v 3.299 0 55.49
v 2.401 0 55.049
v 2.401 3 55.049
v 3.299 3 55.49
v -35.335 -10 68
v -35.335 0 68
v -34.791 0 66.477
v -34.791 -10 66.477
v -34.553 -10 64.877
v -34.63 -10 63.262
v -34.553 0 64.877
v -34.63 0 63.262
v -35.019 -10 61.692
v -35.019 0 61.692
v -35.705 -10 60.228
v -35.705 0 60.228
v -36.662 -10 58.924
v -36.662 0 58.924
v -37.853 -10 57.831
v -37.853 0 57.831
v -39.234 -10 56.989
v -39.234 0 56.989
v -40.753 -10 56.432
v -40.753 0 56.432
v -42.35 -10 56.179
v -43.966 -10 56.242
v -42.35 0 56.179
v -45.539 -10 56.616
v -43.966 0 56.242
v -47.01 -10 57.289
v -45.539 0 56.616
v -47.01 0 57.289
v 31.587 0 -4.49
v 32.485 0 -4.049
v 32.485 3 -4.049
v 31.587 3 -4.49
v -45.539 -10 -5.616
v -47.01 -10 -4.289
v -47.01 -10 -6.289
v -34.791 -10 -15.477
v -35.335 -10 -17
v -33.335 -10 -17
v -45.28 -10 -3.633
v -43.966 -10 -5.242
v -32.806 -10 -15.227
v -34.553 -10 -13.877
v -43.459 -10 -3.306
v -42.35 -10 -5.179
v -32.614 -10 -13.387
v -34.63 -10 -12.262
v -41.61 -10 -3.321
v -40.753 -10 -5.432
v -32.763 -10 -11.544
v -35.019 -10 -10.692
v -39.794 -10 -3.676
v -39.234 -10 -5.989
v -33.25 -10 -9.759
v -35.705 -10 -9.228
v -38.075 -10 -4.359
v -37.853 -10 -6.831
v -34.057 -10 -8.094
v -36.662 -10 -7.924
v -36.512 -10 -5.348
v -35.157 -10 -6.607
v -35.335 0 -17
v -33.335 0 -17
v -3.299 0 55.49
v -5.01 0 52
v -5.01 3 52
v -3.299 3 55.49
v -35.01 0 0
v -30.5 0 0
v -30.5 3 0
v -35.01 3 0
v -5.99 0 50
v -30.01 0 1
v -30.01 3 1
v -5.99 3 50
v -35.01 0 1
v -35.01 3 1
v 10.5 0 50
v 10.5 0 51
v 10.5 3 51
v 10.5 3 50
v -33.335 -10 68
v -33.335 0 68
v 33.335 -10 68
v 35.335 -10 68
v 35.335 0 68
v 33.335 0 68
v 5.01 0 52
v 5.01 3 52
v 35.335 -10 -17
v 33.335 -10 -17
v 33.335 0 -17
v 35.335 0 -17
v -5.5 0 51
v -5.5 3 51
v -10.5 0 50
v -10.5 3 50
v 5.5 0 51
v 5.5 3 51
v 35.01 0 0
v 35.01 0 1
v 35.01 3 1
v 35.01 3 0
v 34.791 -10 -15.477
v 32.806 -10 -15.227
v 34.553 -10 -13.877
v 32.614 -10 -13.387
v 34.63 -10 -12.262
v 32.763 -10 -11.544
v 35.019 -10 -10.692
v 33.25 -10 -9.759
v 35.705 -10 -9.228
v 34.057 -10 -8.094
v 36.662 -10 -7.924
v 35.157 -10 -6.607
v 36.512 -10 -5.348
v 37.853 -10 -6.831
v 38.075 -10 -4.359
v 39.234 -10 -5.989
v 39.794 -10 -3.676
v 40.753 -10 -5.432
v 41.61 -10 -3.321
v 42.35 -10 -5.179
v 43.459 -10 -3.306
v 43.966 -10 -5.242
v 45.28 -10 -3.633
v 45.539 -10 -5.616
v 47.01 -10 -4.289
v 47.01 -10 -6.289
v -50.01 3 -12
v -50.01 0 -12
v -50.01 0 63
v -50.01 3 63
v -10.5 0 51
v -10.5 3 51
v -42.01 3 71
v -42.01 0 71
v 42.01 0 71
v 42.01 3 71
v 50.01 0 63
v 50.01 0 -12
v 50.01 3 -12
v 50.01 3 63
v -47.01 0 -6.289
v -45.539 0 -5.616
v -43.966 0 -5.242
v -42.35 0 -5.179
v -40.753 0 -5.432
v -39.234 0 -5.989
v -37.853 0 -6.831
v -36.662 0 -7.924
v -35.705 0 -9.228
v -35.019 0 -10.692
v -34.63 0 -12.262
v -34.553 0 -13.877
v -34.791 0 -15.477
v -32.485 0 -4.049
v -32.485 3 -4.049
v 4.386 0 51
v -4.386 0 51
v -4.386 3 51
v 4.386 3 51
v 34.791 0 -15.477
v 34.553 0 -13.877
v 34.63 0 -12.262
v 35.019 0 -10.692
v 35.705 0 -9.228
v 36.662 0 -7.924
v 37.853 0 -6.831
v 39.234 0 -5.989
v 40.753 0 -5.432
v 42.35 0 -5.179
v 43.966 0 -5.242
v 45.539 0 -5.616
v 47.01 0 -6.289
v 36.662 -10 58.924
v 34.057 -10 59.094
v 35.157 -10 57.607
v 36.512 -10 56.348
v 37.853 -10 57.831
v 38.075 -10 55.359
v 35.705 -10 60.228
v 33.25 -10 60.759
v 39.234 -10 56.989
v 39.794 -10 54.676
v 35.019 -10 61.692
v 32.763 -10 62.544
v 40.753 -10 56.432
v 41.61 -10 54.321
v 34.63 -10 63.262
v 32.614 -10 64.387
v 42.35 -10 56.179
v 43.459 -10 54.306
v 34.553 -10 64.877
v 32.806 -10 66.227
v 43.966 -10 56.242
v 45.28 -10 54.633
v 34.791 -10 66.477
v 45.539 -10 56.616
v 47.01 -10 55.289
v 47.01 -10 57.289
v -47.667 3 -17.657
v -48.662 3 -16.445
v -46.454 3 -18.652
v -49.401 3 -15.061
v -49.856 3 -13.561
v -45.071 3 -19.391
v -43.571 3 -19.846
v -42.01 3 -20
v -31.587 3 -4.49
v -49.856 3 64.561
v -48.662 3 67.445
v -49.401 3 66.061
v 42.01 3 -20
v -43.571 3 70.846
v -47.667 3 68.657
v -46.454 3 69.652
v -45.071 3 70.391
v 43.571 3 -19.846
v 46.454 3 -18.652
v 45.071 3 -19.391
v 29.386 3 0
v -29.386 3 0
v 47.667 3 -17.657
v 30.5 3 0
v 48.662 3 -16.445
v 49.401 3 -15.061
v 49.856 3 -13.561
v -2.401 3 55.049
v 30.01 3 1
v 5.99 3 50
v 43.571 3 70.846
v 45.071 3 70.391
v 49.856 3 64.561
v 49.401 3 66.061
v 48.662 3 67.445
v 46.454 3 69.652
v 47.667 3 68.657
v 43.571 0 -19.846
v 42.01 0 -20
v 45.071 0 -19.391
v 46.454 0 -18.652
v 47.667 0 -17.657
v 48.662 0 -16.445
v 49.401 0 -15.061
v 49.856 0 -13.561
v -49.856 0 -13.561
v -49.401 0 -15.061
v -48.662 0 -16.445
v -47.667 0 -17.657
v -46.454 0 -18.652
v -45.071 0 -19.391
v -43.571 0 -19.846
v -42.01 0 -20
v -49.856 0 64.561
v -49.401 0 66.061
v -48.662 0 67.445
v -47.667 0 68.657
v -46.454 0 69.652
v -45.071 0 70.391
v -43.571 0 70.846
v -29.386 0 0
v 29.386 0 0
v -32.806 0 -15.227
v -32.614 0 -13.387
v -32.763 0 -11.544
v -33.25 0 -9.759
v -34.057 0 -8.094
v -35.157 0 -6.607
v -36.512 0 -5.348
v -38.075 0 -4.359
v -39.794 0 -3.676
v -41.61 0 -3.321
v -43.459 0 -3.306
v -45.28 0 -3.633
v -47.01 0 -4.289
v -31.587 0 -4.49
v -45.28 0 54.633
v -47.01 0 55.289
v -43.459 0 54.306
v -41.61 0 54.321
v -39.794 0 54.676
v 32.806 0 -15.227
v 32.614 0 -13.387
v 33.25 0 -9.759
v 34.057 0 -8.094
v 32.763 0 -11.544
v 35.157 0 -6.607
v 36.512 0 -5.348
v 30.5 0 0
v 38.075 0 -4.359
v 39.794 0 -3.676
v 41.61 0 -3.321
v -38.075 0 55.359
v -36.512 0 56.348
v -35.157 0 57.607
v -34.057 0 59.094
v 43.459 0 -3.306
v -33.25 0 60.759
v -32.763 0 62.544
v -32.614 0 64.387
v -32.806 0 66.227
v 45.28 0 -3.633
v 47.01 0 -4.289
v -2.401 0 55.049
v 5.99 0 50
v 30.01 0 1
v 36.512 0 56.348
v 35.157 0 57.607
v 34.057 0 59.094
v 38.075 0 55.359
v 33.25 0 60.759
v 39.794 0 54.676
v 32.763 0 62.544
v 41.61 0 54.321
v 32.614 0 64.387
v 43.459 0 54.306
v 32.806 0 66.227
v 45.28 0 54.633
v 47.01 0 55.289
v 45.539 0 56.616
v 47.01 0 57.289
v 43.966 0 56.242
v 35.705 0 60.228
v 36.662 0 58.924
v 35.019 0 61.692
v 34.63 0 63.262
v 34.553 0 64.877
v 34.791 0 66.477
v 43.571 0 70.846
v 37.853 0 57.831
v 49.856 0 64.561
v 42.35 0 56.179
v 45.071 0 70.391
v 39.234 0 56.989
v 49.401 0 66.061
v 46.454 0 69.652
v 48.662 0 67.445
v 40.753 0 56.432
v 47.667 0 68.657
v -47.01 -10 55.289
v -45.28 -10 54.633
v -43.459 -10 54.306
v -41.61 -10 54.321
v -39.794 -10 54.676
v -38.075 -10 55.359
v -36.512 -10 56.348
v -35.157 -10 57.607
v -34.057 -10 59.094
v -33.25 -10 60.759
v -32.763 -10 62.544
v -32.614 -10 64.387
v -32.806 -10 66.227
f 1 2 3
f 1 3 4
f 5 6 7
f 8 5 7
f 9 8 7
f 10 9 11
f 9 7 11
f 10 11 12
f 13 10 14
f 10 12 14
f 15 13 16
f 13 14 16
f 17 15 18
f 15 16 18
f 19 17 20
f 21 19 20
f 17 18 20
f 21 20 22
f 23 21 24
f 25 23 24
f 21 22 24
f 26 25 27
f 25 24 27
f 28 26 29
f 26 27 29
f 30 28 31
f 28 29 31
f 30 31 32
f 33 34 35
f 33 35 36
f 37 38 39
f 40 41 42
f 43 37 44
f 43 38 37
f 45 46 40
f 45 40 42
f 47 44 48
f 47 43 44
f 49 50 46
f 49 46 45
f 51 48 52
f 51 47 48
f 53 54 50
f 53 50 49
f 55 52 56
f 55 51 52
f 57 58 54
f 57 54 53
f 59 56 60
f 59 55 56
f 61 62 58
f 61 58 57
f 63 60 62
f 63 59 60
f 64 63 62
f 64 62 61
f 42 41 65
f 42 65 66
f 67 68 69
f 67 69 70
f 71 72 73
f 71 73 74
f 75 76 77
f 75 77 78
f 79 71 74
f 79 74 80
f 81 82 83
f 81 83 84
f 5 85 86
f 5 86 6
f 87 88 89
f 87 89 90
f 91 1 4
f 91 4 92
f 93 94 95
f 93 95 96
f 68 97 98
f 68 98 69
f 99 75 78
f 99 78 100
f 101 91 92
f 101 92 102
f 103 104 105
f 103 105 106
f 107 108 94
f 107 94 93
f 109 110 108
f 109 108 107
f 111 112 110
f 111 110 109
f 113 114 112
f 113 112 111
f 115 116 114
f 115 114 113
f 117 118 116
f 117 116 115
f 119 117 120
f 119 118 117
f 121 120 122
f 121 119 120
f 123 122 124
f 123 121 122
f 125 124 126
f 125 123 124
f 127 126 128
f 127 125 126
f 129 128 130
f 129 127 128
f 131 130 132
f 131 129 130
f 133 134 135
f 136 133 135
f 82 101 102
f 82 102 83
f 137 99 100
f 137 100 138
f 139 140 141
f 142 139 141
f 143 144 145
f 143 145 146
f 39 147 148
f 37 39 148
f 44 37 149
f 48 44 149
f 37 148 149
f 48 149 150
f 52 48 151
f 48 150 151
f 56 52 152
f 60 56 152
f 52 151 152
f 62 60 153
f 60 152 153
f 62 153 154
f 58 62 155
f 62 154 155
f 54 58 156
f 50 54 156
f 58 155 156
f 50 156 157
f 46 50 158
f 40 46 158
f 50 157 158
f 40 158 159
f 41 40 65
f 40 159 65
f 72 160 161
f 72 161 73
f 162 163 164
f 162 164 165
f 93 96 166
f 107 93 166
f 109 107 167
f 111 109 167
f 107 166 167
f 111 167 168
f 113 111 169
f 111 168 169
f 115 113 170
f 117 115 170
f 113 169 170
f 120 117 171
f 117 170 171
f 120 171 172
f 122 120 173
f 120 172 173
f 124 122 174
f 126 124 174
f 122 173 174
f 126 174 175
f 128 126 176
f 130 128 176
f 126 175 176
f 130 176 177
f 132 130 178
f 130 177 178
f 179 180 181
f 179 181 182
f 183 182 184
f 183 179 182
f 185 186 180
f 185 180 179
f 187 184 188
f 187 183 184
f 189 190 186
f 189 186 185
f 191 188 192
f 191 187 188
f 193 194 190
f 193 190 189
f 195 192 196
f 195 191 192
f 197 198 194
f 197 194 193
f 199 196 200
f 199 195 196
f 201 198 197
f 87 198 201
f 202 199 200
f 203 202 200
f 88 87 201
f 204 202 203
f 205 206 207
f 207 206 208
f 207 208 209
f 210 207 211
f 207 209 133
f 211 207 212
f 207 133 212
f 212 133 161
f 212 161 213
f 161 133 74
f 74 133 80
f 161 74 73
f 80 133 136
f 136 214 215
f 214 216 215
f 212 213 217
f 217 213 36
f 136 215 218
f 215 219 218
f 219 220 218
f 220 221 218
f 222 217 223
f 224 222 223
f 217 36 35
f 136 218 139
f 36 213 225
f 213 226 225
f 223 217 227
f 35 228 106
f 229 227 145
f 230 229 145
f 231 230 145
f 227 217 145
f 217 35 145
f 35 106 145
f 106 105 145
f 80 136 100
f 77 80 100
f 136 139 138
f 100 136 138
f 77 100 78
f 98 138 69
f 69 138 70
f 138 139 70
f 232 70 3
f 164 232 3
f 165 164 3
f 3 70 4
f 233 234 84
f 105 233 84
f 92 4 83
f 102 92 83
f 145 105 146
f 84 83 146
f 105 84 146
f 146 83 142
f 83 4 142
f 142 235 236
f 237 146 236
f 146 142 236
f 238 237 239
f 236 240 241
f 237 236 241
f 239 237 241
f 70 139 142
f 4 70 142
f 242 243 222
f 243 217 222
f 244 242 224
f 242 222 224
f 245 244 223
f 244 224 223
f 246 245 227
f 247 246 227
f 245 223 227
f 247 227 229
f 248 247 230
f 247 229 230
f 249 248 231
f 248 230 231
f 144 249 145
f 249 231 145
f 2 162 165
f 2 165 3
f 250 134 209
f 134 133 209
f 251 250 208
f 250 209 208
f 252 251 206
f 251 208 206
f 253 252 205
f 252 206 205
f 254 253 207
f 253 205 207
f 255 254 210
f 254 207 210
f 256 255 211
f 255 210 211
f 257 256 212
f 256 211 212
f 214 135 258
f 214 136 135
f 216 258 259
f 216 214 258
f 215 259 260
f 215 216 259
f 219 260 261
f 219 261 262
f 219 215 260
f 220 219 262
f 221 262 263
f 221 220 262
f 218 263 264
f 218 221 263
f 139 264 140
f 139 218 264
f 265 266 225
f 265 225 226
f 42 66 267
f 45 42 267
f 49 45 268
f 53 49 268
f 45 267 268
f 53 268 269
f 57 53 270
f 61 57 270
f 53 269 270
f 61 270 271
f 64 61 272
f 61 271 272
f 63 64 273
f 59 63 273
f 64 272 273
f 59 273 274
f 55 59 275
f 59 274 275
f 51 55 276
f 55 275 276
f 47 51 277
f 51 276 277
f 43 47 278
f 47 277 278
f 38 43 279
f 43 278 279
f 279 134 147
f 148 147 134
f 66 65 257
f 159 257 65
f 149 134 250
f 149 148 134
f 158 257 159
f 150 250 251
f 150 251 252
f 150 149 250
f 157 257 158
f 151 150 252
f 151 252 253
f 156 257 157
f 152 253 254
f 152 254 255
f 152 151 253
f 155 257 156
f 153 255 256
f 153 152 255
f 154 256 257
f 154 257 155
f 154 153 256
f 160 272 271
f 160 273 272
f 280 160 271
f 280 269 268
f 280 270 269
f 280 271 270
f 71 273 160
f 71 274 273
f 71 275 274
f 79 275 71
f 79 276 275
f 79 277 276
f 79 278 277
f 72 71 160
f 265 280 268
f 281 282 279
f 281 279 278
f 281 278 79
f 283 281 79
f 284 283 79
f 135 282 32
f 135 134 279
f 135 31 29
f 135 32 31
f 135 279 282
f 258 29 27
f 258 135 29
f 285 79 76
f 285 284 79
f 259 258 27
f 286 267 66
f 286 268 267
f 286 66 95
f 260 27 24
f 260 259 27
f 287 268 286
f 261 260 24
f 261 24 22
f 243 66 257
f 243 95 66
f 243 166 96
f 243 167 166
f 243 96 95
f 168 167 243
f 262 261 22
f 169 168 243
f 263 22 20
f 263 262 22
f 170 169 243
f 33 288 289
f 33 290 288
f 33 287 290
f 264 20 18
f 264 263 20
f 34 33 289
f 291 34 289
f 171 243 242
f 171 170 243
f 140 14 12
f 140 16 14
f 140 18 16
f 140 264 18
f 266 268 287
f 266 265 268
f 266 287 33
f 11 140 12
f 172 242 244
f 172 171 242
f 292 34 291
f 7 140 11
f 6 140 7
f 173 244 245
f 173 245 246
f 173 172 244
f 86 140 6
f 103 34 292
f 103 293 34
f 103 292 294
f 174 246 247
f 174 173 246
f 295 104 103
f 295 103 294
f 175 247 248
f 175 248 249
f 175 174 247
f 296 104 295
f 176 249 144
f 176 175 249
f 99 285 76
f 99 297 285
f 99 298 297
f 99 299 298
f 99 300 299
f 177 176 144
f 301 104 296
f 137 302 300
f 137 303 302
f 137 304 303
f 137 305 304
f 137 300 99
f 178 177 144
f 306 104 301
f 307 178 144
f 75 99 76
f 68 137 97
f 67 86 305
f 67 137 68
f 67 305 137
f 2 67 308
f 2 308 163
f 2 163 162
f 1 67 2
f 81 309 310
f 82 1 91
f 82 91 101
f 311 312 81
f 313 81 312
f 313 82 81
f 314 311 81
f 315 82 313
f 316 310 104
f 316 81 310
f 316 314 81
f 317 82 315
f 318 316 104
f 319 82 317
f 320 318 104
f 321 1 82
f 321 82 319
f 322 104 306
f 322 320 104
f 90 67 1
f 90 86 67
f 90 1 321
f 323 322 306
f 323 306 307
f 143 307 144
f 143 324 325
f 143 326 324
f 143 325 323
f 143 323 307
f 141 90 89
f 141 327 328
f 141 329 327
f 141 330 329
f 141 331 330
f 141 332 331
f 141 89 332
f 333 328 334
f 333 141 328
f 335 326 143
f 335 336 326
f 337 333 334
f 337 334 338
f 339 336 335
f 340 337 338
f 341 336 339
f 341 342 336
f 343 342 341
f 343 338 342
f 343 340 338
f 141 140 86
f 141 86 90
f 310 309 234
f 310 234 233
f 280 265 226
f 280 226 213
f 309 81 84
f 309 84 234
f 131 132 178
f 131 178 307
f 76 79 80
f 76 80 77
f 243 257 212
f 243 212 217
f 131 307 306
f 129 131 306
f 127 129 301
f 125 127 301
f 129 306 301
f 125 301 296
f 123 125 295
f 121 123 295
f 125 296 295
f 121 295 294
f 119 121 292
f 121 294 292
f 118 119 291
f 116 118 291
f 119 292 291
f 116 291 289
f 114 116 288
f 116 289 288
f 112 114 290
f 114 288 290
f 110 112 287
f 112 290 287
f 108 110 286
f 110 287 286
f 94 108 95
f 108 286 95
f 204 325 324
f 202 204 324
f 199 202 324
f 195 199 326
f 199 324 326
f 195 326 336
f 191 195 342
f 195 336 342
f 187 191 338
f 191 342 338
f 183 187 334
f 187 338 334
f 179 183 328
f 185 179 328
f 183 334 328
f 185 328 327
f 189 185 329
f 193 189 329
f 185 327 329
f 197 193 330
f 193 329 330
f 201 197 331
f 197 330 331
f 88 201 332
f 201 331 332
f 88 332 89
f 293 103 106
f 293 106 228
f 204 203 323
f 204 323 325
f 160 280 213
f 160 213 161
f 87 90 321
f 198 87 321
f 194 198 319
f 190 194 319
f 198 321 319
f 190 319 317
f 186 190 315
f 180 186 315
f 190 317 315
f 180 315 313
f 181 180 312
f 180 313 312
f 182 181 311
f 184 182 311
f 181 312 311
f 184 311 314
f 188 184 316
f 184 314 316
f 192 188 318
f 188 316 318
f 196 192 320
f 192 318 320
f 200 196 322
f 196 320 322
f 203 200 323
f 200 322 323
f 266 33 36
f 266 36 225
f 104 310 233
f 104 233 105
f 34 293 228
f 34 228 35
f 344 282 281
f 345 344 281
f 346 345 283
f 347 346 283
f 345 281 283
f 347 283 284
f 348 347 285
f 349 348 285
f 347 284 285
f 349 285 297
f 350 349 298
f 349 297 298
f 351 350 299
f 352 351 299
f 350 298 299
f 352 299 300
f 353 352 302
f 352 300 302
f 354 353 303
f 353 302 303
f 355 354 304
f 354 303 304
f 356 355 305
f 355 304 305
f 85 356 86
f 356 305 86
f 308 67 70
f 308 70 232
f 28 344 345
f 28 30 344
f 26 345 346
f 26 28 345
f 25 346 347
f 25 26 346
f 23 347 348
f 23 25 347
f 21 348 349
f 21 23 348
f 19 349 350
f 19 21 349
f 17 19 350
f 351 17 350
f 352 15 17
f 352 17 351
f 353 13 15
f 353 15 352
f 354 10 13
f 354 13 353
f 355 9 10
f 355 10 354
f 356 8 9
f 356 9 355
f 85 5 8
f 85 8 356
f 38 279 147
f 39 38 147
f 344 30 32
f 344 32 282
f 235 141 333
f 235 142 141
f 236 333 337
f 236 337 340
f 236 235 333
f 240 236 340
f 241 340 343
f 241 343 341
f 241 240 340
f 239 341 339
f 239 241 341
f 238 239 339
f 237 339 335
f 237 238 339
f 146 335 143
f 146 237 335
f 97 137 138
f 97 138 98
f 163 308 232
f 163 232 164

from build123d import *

# Parameters (mm, degrees)
F0_W     = 100.019608
F0_H     = 91
F2_DEPTH = 3
F3_DEPTH = 10
F4_R     = 8


with BuildPart() as f2:
    # F0 (on Front) → F2 (new body)
    with BuildSketch(Plane.XZ):
        with Locations((0, 25.5)):
            Rectangle(F0_W, F0_H)
        Polygon((0, 0), (-29.386316, 0), (-31.587102, -4.489604), (-32.485023, -4.049446), (-30.5, 0), (-31.613684, 0), (-35.009804, 0), (-35.009804, 1), (-30.009804, 1), (-5.990196, 50), (-10.5, 50), (-10.5, 51), (-5.5, 51), (-5.009804, 52), (-3.299214, 55.489604), (-2.401293, 55.049446), (-4.386316, 51), (0, 51), (4.386316, 51), (2.401293, 55.049446), (3.299214, 55.489604), (5.009804, 52), (5.5, 51), (10.5, 51), (10.5, 50), (5.990196, 50), (30.009804, 1), (35.009804, 1), (35.009804, 0), (31.613684, 0), (30.5, 0), (32.485023, -4.049446), (31.587102, -4.489604), (29.386316, 0), align=None, mode=Mode.SUBTRACT)
    extrude(amount=-F2_DEPTH)

    # F1 (on face) → F3 (join)
    with BuildSketch(Plane.XZ):
        with BuildLine():
            Line((-35.334654, -17), (-33.334654, -17))
            ThreePointArc((-33.334654, -17), (-35.804867, -5.945831), (-47.009804, -4.288724))
            Line((-47.009804, -4.288724), (-47.009804, -6.288724))
            ThreePointArc((-47.009804, -6.288724), (-37.230822, -7.34828), (-35.334654, -17))
        make_face()
        with BuildLine():
            ThreePointArc((-47.009804, 55.288724), (-35.804867, 56.945831), (-33.334654, 68))
            Line((-33.334654, 68), (-35.334654, 68))
            ThreePointArc((-35.334654, 68), (-37.230822, 58.34828), (-47.009804, 57.288724))
            Line((-47.009804, 57.288724), (-47.009804, 55.288724))
        make_face()
        with BuildLine():
            Line((35.334654, 68), (33.334654, 68))
            ThreePointArc((33.334654, 68), (35.804867, 56.945831), (47.009804, 55.288724))
            Line((47.009804, 55.288724), (47.009804, 57.288724))
            ThreePointArc((47.009804, 57.288724), (37.230822, 58.34828), (35.334654, 68))
        make_face()
        with BuildLine():
            ThreePointArc((47.009804, -4.288724), (35.804867, -5.945831), (33.334654, -17))
            Line((33.334654, -17), (35.334654, -17))
            ThreePointArc((35.334654, -17), (37.230822, -7.34828), (47.009804, -6.288724))
            Line((47.009804, -6.288724), (47.009804, -4.288724))
        make_face()
    extrude(amount=F3_DEPTH)

    # F4
    f4_edges = [f2.edges().sort_by_distance(p)[0] for p in [
        (-50.009804, 1.5, 71),
        (50.009804, 1.5, 71),
        (50.009804, 1.5, -20),
        (-50.009804, 1.5, -20),
    ]]
    fillet(f4_edges, radius=F4_R)


solid = f2.part
